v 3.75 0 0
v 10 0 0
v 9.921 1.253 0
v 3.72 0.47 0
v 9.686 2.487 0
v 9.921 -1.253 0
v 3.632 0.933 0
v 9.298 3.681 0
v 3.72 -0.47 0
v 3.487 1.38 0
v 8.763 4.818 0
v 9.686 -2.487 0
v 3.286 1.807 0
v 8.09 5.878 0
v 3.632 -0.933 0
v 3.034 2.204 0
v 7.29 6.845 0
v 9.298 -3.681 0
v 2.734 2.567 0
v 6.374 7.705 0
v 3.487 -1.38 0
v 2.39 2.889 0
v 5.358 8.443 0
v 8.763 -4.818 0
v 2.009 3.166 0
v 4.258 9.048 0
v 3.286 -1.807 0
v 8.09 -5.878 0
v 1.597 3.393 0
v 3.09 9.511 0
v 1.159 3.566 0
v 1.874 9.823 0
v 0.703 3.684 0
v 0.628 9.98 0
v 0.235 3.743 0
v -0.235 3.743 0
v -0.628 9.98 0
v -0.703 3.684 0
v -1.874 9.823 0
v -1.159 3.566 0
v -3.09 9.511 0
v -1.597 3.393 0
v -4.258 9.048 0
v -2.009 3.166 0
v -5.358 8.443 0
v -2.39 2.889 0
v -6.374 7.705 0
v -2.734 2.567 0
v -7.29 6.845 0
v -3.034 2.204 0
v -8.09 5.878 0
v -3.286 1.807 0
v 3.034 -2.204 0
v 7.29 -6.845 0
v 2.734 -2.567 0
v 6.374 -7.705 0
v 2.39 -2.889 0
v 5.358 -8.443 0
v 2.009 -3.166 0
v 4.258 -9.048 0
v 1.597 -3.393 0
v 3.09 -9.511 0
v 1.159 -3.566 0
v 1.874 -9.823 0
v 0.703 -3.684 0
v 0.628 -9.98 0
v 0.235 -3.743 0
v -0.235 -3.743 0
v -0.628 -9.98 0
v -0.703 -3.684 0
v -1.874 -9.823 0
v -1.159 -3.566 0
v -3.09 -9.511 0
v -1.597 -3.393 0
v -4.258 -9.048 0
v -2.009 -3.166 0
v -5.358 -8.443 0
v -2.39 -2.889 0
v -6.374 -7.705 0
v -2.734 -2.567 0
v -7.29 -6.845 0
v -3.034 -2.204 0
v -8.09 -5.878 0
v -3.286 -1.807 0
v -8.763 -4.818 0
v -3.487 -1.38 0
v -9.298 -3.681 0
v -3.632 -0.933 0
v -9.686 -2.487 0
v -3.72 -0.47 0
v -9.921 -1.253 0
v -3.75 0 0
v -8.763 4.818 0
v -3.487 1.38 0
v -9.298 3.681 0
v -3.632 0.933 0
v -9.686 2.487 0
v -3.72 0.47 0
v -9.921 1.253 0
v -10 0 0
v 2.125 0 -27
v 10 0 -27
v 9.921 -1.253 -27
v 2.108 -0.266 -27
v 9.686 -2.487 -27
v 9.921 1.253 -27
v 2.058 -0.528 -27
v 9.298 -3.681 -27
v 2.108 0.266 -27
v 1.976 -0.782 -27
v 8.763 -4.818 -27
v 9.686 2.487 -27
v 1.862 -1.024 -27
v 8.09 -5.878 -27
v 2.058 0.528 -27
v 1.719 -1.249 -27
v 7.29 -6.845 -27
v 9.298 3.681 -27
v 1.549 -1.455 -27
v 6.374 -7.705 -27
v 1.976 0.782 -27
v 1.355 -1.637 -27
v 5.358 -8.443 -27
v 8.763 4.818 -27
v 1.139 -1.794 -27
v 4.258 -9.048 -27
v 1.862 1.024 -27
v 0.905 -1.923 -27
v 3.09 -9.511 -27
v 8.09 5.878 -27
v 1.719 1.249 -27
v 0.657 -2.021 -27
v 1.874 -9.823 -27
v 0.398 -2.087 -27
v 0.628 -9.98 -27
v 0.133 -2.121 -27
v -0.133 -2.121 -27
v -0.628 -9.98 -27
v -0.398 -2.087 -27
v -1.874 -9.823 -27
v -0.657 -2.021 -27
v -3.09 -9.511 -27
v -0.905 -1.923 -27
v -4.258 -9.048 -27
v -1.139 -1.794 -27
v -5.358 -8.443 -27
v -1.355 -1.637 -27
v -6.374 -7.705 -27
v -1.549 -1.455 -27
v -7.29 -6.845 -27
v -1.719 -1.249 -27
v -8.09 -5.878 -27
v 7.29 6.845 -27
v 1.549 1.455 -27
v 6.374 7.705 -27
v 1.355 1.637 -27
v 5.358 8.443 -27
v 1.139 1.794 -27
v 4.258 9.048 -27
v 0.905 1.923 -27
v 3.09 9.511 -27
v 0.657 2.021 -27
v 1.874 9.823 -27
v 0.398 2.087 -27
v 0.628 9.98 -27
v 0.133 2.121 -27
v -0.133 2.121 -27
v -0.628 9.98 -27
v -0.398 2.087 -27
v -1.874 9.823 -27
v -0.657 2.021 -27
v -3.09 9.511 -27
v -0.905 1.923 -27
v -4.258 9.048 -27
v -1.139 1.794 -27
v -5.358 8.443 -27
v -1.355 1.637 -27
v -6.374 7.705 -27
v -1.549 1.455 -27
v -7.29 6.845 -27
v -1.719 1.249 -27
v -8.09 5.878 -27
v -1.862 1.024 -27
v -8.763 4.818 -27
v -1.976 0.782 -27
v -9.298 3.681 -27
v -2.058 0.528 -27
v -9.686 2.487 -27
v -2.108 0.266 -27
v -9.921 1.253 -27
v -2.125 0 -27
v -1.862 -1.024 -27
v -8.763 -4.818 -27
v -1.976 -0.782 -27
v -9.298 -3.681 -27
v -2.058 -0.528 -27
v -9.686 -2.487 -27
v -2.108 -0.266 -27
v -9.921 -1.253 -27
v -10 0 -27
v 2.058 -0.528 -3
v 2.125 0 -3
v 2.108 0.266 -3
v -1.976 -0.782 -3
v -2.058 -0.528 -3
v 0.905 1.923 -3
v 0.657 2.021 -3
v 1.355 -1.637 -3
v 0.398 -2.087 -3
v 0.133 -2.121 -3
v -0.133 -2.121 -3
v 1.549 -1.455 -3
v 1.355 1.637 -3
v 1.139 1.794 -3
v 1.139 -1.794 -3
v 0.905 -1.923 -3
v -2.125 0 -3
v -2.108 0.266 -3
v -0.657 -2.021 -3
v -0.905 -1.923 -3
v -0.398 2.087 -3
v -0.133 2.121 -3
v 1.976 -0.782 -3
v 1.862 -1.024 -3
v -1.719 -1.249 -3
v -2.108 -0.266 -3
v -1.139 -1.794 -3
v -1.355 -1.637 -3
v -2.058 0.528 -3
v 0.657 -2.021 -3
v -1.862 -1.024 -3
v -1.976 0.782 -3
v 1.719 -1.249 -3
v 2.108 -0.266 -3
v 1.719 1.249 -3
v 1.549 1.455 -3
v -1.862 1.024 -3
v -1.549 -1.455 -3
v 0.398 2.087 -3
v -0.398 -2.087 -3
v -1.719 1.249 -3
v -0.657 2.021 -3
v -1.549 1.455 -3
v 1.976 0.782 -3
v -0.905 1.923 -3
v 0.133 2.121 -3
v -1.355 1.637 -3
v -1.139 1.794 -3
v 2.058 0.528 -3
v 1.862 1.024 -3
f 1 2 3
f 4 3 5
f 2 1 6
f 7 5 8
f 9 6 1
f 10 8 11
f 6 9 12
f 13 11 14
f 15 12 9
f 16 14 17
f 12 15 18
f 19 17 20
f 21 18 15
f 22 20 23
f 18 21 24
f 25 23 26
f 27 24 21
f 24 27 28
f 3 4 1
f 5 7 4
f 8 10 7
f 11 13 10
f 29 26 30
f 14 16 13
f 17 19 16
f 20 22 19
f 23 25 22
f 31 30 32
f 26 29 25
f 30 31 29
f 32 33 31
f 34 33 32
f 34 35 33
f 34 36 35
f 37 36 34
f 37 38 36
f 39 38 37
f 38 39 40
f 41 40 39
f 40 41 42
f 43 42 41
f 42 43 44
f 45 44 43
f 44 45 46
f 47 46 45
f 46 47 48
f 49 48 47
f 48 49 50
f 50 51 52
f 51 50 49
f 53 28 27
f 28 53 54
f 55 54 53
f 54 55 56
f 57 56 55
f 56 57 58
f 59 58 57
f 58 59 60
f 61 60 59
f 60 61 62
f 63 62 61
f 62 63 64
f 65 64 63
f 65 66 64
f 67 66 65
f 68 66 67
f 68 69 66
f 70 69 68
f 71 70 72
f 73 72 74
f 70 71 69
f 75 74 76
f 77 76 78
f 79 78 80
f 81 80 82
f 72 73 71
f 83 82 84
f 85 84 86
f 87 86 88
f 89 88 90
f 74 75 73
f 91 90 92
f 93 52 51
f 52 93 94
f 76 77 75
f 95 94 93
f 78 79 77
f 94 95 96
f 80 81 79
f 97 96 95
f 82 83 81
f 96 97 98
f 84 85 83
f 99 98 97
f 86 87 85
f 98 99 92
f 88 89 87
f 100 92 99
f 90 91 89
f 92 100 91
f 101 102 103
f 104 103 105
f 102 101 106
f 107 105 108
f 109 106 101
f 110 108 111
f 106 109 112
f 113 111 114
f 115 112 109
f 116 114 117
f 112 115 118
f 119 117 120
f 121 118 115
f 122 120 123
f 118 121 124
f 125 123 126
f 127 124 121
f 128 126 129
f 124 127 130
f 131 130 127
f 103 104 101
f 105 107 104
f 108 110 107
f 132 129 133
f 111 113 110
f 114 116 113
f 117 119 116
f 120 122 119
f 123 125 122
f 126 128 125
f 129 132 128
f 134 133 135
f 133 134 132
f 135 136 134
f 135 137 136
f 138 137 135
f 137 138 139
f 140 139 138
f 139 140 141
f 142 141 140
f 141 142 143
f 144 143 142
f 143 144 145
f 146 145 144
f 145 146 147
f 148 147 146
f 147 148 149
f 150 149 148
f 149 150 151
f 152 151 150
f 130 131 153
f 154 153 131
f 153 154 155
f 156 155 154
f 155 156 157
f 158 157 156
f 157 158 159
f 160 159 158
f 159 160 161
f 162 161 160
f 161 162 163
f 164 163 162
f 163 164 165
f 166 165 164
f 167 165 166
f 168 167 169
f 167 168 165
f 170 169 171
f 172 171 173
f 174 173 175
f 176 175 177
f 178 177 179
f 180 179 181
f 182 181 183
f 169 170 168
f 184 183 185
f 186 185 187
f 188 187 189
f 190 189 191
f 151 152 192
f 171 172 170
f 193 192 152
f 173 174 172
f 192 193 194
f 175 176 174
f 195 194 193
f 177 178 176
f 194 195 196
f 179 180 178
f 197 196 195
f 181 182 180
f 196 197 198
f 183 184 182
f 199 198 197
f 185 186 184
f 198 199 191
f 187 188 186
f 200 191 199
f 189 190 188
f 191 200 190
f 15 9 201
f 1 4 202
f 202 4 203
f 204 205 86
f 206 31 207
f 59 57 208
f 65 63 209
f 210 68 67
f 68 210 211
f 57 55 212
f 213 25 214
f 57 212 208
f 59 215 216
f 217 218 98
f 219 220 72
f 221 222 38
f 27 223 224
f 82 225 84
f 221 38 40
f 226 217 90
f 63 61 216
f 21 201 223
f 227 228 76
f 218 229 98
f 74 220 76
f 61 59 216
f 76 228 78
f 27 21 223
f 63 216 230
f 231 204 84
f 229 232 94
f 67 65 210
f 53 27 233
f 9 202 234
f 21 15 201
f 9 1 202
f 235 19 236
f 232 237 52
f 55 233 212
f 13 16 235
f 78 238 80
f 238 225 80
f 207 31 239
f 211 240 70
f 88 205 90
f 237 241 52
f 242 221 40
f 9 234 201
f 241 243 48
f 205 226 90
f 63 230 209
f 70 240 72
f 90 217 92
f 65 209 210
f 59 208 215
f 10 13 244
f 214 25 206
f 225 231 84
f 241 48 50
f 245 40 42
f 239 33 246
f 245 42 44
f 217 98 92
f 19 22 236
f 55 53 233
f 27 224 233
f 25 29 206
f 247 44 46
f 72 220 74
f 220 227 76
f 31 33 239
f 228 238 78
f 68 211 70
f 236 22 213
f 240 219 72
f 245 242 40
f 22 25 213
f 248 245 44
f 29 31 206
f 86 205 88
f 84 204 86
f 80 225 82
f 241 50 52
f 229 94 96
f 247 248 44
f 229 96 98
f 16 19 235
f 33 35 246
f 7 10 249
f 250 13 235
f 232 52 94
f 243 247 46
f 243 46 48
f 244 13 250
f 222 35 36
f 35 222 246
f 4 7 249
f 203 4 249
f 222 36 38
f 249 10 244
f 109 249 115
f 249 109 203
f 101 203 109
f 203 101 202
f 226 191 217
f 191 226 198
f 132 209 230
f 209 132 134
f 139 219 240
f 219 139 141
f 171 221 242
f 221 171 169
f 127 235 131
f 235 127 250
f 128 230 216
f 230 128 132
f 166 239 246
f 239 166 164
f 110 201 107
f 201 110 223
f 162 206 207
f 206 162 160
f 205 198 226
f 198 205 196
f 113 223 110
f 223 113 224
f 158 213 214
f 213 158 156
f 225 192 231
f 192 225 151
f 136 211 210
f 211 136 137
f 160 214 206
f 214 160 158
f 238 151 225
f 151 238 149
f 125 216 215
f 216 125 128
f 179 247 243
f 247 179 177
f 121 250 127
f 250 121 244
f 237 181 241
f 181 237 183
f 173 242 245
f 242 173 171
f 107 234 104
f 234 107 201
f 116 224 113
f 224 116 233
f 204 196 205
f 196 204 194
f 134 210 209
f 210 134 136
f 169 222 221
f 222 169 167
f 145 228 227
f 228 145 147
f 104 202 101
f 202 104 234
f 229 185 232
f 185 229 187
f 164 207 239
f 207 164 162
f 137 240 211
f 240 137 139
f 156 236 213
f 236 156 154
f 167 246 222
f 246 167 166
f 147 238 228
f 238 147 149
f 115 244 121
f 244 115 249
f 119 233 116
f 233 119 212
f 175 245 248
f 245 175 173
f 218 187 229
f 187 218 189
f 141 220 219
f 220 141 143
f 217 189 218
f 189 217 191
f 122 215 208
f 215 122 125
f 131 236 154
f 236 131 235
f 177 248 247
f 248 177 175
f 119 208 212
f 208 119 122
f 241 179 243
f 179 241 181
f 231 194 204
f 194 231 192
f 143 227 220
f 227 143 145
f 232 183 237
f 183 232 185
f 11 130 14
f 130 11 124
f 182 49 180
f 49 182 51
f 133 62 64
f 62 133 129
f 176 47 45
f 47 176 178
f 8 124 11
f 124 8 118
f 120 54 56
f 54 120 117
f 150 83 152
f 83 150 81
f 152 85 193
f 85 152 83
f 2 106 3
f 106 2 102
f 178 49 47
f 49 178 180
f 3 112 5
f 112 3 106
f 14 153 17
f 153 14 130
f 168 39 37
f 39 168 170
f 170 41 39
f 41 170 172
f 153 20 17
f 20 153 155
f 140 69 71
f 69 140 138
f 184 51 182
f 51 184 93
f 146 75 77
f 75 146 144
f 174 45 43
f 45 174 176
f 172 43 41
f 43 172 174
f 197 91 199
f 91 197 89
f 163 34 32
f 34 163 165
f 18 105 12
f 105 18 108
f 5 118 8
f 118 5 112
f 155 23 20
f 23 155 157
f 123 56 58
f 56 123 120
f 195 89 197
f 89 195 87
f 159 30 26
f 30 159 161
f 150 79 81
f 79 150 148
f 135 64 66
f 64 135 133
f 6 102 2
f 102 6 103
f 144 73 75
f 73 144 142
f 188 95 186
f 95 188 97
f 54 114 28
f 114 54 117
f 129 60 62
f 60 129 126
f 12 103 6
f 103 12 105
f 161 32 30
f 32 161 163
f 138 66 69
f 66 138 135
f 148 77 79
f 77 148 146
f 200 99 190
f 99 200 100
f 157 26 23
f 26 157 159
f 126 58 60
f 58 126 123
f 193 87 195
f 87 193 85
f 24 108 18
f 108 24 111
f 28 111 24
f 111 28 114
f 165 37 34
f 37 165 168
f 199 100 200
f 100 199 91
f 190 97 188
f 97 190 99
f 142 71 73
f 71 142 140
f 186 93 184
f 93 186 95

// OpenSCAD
$fn = 50;


difference() {
	union() {
		translate(v = [0, 0, -27.0000000000]) {
			cylinder(h = 27, r = 10.0000000000);
		}
		cylinder(h = 0, r = 20.0000000000);
	}
	union() {
		translate(v = [0, 0, 0]) {
			rotate(a = [0, 0, 0]) {
				difference() {
					union() {
						#translate(v = [0, 0, -27.0000000000]) {
							cylinder(h = 27, r = 2.0000000000);
						}
						#translate(v = [0, 0, -3]) {
							cylinder(h = 3, r = 10.0000000000, r1 = 2.1250000000, r2 = 3.7500000000);
						}
						#translate(v = [0, 0, -27.0000000000]) {
							cylinder(h = 27, r = 2.1250000000);
						}
						#translate(v = [0, 0, -27.0000000000]) {
							cylinder(h = 27, r = 2.0000000000);
						}
					}
					union();
				}
			}
		}
	}
}
